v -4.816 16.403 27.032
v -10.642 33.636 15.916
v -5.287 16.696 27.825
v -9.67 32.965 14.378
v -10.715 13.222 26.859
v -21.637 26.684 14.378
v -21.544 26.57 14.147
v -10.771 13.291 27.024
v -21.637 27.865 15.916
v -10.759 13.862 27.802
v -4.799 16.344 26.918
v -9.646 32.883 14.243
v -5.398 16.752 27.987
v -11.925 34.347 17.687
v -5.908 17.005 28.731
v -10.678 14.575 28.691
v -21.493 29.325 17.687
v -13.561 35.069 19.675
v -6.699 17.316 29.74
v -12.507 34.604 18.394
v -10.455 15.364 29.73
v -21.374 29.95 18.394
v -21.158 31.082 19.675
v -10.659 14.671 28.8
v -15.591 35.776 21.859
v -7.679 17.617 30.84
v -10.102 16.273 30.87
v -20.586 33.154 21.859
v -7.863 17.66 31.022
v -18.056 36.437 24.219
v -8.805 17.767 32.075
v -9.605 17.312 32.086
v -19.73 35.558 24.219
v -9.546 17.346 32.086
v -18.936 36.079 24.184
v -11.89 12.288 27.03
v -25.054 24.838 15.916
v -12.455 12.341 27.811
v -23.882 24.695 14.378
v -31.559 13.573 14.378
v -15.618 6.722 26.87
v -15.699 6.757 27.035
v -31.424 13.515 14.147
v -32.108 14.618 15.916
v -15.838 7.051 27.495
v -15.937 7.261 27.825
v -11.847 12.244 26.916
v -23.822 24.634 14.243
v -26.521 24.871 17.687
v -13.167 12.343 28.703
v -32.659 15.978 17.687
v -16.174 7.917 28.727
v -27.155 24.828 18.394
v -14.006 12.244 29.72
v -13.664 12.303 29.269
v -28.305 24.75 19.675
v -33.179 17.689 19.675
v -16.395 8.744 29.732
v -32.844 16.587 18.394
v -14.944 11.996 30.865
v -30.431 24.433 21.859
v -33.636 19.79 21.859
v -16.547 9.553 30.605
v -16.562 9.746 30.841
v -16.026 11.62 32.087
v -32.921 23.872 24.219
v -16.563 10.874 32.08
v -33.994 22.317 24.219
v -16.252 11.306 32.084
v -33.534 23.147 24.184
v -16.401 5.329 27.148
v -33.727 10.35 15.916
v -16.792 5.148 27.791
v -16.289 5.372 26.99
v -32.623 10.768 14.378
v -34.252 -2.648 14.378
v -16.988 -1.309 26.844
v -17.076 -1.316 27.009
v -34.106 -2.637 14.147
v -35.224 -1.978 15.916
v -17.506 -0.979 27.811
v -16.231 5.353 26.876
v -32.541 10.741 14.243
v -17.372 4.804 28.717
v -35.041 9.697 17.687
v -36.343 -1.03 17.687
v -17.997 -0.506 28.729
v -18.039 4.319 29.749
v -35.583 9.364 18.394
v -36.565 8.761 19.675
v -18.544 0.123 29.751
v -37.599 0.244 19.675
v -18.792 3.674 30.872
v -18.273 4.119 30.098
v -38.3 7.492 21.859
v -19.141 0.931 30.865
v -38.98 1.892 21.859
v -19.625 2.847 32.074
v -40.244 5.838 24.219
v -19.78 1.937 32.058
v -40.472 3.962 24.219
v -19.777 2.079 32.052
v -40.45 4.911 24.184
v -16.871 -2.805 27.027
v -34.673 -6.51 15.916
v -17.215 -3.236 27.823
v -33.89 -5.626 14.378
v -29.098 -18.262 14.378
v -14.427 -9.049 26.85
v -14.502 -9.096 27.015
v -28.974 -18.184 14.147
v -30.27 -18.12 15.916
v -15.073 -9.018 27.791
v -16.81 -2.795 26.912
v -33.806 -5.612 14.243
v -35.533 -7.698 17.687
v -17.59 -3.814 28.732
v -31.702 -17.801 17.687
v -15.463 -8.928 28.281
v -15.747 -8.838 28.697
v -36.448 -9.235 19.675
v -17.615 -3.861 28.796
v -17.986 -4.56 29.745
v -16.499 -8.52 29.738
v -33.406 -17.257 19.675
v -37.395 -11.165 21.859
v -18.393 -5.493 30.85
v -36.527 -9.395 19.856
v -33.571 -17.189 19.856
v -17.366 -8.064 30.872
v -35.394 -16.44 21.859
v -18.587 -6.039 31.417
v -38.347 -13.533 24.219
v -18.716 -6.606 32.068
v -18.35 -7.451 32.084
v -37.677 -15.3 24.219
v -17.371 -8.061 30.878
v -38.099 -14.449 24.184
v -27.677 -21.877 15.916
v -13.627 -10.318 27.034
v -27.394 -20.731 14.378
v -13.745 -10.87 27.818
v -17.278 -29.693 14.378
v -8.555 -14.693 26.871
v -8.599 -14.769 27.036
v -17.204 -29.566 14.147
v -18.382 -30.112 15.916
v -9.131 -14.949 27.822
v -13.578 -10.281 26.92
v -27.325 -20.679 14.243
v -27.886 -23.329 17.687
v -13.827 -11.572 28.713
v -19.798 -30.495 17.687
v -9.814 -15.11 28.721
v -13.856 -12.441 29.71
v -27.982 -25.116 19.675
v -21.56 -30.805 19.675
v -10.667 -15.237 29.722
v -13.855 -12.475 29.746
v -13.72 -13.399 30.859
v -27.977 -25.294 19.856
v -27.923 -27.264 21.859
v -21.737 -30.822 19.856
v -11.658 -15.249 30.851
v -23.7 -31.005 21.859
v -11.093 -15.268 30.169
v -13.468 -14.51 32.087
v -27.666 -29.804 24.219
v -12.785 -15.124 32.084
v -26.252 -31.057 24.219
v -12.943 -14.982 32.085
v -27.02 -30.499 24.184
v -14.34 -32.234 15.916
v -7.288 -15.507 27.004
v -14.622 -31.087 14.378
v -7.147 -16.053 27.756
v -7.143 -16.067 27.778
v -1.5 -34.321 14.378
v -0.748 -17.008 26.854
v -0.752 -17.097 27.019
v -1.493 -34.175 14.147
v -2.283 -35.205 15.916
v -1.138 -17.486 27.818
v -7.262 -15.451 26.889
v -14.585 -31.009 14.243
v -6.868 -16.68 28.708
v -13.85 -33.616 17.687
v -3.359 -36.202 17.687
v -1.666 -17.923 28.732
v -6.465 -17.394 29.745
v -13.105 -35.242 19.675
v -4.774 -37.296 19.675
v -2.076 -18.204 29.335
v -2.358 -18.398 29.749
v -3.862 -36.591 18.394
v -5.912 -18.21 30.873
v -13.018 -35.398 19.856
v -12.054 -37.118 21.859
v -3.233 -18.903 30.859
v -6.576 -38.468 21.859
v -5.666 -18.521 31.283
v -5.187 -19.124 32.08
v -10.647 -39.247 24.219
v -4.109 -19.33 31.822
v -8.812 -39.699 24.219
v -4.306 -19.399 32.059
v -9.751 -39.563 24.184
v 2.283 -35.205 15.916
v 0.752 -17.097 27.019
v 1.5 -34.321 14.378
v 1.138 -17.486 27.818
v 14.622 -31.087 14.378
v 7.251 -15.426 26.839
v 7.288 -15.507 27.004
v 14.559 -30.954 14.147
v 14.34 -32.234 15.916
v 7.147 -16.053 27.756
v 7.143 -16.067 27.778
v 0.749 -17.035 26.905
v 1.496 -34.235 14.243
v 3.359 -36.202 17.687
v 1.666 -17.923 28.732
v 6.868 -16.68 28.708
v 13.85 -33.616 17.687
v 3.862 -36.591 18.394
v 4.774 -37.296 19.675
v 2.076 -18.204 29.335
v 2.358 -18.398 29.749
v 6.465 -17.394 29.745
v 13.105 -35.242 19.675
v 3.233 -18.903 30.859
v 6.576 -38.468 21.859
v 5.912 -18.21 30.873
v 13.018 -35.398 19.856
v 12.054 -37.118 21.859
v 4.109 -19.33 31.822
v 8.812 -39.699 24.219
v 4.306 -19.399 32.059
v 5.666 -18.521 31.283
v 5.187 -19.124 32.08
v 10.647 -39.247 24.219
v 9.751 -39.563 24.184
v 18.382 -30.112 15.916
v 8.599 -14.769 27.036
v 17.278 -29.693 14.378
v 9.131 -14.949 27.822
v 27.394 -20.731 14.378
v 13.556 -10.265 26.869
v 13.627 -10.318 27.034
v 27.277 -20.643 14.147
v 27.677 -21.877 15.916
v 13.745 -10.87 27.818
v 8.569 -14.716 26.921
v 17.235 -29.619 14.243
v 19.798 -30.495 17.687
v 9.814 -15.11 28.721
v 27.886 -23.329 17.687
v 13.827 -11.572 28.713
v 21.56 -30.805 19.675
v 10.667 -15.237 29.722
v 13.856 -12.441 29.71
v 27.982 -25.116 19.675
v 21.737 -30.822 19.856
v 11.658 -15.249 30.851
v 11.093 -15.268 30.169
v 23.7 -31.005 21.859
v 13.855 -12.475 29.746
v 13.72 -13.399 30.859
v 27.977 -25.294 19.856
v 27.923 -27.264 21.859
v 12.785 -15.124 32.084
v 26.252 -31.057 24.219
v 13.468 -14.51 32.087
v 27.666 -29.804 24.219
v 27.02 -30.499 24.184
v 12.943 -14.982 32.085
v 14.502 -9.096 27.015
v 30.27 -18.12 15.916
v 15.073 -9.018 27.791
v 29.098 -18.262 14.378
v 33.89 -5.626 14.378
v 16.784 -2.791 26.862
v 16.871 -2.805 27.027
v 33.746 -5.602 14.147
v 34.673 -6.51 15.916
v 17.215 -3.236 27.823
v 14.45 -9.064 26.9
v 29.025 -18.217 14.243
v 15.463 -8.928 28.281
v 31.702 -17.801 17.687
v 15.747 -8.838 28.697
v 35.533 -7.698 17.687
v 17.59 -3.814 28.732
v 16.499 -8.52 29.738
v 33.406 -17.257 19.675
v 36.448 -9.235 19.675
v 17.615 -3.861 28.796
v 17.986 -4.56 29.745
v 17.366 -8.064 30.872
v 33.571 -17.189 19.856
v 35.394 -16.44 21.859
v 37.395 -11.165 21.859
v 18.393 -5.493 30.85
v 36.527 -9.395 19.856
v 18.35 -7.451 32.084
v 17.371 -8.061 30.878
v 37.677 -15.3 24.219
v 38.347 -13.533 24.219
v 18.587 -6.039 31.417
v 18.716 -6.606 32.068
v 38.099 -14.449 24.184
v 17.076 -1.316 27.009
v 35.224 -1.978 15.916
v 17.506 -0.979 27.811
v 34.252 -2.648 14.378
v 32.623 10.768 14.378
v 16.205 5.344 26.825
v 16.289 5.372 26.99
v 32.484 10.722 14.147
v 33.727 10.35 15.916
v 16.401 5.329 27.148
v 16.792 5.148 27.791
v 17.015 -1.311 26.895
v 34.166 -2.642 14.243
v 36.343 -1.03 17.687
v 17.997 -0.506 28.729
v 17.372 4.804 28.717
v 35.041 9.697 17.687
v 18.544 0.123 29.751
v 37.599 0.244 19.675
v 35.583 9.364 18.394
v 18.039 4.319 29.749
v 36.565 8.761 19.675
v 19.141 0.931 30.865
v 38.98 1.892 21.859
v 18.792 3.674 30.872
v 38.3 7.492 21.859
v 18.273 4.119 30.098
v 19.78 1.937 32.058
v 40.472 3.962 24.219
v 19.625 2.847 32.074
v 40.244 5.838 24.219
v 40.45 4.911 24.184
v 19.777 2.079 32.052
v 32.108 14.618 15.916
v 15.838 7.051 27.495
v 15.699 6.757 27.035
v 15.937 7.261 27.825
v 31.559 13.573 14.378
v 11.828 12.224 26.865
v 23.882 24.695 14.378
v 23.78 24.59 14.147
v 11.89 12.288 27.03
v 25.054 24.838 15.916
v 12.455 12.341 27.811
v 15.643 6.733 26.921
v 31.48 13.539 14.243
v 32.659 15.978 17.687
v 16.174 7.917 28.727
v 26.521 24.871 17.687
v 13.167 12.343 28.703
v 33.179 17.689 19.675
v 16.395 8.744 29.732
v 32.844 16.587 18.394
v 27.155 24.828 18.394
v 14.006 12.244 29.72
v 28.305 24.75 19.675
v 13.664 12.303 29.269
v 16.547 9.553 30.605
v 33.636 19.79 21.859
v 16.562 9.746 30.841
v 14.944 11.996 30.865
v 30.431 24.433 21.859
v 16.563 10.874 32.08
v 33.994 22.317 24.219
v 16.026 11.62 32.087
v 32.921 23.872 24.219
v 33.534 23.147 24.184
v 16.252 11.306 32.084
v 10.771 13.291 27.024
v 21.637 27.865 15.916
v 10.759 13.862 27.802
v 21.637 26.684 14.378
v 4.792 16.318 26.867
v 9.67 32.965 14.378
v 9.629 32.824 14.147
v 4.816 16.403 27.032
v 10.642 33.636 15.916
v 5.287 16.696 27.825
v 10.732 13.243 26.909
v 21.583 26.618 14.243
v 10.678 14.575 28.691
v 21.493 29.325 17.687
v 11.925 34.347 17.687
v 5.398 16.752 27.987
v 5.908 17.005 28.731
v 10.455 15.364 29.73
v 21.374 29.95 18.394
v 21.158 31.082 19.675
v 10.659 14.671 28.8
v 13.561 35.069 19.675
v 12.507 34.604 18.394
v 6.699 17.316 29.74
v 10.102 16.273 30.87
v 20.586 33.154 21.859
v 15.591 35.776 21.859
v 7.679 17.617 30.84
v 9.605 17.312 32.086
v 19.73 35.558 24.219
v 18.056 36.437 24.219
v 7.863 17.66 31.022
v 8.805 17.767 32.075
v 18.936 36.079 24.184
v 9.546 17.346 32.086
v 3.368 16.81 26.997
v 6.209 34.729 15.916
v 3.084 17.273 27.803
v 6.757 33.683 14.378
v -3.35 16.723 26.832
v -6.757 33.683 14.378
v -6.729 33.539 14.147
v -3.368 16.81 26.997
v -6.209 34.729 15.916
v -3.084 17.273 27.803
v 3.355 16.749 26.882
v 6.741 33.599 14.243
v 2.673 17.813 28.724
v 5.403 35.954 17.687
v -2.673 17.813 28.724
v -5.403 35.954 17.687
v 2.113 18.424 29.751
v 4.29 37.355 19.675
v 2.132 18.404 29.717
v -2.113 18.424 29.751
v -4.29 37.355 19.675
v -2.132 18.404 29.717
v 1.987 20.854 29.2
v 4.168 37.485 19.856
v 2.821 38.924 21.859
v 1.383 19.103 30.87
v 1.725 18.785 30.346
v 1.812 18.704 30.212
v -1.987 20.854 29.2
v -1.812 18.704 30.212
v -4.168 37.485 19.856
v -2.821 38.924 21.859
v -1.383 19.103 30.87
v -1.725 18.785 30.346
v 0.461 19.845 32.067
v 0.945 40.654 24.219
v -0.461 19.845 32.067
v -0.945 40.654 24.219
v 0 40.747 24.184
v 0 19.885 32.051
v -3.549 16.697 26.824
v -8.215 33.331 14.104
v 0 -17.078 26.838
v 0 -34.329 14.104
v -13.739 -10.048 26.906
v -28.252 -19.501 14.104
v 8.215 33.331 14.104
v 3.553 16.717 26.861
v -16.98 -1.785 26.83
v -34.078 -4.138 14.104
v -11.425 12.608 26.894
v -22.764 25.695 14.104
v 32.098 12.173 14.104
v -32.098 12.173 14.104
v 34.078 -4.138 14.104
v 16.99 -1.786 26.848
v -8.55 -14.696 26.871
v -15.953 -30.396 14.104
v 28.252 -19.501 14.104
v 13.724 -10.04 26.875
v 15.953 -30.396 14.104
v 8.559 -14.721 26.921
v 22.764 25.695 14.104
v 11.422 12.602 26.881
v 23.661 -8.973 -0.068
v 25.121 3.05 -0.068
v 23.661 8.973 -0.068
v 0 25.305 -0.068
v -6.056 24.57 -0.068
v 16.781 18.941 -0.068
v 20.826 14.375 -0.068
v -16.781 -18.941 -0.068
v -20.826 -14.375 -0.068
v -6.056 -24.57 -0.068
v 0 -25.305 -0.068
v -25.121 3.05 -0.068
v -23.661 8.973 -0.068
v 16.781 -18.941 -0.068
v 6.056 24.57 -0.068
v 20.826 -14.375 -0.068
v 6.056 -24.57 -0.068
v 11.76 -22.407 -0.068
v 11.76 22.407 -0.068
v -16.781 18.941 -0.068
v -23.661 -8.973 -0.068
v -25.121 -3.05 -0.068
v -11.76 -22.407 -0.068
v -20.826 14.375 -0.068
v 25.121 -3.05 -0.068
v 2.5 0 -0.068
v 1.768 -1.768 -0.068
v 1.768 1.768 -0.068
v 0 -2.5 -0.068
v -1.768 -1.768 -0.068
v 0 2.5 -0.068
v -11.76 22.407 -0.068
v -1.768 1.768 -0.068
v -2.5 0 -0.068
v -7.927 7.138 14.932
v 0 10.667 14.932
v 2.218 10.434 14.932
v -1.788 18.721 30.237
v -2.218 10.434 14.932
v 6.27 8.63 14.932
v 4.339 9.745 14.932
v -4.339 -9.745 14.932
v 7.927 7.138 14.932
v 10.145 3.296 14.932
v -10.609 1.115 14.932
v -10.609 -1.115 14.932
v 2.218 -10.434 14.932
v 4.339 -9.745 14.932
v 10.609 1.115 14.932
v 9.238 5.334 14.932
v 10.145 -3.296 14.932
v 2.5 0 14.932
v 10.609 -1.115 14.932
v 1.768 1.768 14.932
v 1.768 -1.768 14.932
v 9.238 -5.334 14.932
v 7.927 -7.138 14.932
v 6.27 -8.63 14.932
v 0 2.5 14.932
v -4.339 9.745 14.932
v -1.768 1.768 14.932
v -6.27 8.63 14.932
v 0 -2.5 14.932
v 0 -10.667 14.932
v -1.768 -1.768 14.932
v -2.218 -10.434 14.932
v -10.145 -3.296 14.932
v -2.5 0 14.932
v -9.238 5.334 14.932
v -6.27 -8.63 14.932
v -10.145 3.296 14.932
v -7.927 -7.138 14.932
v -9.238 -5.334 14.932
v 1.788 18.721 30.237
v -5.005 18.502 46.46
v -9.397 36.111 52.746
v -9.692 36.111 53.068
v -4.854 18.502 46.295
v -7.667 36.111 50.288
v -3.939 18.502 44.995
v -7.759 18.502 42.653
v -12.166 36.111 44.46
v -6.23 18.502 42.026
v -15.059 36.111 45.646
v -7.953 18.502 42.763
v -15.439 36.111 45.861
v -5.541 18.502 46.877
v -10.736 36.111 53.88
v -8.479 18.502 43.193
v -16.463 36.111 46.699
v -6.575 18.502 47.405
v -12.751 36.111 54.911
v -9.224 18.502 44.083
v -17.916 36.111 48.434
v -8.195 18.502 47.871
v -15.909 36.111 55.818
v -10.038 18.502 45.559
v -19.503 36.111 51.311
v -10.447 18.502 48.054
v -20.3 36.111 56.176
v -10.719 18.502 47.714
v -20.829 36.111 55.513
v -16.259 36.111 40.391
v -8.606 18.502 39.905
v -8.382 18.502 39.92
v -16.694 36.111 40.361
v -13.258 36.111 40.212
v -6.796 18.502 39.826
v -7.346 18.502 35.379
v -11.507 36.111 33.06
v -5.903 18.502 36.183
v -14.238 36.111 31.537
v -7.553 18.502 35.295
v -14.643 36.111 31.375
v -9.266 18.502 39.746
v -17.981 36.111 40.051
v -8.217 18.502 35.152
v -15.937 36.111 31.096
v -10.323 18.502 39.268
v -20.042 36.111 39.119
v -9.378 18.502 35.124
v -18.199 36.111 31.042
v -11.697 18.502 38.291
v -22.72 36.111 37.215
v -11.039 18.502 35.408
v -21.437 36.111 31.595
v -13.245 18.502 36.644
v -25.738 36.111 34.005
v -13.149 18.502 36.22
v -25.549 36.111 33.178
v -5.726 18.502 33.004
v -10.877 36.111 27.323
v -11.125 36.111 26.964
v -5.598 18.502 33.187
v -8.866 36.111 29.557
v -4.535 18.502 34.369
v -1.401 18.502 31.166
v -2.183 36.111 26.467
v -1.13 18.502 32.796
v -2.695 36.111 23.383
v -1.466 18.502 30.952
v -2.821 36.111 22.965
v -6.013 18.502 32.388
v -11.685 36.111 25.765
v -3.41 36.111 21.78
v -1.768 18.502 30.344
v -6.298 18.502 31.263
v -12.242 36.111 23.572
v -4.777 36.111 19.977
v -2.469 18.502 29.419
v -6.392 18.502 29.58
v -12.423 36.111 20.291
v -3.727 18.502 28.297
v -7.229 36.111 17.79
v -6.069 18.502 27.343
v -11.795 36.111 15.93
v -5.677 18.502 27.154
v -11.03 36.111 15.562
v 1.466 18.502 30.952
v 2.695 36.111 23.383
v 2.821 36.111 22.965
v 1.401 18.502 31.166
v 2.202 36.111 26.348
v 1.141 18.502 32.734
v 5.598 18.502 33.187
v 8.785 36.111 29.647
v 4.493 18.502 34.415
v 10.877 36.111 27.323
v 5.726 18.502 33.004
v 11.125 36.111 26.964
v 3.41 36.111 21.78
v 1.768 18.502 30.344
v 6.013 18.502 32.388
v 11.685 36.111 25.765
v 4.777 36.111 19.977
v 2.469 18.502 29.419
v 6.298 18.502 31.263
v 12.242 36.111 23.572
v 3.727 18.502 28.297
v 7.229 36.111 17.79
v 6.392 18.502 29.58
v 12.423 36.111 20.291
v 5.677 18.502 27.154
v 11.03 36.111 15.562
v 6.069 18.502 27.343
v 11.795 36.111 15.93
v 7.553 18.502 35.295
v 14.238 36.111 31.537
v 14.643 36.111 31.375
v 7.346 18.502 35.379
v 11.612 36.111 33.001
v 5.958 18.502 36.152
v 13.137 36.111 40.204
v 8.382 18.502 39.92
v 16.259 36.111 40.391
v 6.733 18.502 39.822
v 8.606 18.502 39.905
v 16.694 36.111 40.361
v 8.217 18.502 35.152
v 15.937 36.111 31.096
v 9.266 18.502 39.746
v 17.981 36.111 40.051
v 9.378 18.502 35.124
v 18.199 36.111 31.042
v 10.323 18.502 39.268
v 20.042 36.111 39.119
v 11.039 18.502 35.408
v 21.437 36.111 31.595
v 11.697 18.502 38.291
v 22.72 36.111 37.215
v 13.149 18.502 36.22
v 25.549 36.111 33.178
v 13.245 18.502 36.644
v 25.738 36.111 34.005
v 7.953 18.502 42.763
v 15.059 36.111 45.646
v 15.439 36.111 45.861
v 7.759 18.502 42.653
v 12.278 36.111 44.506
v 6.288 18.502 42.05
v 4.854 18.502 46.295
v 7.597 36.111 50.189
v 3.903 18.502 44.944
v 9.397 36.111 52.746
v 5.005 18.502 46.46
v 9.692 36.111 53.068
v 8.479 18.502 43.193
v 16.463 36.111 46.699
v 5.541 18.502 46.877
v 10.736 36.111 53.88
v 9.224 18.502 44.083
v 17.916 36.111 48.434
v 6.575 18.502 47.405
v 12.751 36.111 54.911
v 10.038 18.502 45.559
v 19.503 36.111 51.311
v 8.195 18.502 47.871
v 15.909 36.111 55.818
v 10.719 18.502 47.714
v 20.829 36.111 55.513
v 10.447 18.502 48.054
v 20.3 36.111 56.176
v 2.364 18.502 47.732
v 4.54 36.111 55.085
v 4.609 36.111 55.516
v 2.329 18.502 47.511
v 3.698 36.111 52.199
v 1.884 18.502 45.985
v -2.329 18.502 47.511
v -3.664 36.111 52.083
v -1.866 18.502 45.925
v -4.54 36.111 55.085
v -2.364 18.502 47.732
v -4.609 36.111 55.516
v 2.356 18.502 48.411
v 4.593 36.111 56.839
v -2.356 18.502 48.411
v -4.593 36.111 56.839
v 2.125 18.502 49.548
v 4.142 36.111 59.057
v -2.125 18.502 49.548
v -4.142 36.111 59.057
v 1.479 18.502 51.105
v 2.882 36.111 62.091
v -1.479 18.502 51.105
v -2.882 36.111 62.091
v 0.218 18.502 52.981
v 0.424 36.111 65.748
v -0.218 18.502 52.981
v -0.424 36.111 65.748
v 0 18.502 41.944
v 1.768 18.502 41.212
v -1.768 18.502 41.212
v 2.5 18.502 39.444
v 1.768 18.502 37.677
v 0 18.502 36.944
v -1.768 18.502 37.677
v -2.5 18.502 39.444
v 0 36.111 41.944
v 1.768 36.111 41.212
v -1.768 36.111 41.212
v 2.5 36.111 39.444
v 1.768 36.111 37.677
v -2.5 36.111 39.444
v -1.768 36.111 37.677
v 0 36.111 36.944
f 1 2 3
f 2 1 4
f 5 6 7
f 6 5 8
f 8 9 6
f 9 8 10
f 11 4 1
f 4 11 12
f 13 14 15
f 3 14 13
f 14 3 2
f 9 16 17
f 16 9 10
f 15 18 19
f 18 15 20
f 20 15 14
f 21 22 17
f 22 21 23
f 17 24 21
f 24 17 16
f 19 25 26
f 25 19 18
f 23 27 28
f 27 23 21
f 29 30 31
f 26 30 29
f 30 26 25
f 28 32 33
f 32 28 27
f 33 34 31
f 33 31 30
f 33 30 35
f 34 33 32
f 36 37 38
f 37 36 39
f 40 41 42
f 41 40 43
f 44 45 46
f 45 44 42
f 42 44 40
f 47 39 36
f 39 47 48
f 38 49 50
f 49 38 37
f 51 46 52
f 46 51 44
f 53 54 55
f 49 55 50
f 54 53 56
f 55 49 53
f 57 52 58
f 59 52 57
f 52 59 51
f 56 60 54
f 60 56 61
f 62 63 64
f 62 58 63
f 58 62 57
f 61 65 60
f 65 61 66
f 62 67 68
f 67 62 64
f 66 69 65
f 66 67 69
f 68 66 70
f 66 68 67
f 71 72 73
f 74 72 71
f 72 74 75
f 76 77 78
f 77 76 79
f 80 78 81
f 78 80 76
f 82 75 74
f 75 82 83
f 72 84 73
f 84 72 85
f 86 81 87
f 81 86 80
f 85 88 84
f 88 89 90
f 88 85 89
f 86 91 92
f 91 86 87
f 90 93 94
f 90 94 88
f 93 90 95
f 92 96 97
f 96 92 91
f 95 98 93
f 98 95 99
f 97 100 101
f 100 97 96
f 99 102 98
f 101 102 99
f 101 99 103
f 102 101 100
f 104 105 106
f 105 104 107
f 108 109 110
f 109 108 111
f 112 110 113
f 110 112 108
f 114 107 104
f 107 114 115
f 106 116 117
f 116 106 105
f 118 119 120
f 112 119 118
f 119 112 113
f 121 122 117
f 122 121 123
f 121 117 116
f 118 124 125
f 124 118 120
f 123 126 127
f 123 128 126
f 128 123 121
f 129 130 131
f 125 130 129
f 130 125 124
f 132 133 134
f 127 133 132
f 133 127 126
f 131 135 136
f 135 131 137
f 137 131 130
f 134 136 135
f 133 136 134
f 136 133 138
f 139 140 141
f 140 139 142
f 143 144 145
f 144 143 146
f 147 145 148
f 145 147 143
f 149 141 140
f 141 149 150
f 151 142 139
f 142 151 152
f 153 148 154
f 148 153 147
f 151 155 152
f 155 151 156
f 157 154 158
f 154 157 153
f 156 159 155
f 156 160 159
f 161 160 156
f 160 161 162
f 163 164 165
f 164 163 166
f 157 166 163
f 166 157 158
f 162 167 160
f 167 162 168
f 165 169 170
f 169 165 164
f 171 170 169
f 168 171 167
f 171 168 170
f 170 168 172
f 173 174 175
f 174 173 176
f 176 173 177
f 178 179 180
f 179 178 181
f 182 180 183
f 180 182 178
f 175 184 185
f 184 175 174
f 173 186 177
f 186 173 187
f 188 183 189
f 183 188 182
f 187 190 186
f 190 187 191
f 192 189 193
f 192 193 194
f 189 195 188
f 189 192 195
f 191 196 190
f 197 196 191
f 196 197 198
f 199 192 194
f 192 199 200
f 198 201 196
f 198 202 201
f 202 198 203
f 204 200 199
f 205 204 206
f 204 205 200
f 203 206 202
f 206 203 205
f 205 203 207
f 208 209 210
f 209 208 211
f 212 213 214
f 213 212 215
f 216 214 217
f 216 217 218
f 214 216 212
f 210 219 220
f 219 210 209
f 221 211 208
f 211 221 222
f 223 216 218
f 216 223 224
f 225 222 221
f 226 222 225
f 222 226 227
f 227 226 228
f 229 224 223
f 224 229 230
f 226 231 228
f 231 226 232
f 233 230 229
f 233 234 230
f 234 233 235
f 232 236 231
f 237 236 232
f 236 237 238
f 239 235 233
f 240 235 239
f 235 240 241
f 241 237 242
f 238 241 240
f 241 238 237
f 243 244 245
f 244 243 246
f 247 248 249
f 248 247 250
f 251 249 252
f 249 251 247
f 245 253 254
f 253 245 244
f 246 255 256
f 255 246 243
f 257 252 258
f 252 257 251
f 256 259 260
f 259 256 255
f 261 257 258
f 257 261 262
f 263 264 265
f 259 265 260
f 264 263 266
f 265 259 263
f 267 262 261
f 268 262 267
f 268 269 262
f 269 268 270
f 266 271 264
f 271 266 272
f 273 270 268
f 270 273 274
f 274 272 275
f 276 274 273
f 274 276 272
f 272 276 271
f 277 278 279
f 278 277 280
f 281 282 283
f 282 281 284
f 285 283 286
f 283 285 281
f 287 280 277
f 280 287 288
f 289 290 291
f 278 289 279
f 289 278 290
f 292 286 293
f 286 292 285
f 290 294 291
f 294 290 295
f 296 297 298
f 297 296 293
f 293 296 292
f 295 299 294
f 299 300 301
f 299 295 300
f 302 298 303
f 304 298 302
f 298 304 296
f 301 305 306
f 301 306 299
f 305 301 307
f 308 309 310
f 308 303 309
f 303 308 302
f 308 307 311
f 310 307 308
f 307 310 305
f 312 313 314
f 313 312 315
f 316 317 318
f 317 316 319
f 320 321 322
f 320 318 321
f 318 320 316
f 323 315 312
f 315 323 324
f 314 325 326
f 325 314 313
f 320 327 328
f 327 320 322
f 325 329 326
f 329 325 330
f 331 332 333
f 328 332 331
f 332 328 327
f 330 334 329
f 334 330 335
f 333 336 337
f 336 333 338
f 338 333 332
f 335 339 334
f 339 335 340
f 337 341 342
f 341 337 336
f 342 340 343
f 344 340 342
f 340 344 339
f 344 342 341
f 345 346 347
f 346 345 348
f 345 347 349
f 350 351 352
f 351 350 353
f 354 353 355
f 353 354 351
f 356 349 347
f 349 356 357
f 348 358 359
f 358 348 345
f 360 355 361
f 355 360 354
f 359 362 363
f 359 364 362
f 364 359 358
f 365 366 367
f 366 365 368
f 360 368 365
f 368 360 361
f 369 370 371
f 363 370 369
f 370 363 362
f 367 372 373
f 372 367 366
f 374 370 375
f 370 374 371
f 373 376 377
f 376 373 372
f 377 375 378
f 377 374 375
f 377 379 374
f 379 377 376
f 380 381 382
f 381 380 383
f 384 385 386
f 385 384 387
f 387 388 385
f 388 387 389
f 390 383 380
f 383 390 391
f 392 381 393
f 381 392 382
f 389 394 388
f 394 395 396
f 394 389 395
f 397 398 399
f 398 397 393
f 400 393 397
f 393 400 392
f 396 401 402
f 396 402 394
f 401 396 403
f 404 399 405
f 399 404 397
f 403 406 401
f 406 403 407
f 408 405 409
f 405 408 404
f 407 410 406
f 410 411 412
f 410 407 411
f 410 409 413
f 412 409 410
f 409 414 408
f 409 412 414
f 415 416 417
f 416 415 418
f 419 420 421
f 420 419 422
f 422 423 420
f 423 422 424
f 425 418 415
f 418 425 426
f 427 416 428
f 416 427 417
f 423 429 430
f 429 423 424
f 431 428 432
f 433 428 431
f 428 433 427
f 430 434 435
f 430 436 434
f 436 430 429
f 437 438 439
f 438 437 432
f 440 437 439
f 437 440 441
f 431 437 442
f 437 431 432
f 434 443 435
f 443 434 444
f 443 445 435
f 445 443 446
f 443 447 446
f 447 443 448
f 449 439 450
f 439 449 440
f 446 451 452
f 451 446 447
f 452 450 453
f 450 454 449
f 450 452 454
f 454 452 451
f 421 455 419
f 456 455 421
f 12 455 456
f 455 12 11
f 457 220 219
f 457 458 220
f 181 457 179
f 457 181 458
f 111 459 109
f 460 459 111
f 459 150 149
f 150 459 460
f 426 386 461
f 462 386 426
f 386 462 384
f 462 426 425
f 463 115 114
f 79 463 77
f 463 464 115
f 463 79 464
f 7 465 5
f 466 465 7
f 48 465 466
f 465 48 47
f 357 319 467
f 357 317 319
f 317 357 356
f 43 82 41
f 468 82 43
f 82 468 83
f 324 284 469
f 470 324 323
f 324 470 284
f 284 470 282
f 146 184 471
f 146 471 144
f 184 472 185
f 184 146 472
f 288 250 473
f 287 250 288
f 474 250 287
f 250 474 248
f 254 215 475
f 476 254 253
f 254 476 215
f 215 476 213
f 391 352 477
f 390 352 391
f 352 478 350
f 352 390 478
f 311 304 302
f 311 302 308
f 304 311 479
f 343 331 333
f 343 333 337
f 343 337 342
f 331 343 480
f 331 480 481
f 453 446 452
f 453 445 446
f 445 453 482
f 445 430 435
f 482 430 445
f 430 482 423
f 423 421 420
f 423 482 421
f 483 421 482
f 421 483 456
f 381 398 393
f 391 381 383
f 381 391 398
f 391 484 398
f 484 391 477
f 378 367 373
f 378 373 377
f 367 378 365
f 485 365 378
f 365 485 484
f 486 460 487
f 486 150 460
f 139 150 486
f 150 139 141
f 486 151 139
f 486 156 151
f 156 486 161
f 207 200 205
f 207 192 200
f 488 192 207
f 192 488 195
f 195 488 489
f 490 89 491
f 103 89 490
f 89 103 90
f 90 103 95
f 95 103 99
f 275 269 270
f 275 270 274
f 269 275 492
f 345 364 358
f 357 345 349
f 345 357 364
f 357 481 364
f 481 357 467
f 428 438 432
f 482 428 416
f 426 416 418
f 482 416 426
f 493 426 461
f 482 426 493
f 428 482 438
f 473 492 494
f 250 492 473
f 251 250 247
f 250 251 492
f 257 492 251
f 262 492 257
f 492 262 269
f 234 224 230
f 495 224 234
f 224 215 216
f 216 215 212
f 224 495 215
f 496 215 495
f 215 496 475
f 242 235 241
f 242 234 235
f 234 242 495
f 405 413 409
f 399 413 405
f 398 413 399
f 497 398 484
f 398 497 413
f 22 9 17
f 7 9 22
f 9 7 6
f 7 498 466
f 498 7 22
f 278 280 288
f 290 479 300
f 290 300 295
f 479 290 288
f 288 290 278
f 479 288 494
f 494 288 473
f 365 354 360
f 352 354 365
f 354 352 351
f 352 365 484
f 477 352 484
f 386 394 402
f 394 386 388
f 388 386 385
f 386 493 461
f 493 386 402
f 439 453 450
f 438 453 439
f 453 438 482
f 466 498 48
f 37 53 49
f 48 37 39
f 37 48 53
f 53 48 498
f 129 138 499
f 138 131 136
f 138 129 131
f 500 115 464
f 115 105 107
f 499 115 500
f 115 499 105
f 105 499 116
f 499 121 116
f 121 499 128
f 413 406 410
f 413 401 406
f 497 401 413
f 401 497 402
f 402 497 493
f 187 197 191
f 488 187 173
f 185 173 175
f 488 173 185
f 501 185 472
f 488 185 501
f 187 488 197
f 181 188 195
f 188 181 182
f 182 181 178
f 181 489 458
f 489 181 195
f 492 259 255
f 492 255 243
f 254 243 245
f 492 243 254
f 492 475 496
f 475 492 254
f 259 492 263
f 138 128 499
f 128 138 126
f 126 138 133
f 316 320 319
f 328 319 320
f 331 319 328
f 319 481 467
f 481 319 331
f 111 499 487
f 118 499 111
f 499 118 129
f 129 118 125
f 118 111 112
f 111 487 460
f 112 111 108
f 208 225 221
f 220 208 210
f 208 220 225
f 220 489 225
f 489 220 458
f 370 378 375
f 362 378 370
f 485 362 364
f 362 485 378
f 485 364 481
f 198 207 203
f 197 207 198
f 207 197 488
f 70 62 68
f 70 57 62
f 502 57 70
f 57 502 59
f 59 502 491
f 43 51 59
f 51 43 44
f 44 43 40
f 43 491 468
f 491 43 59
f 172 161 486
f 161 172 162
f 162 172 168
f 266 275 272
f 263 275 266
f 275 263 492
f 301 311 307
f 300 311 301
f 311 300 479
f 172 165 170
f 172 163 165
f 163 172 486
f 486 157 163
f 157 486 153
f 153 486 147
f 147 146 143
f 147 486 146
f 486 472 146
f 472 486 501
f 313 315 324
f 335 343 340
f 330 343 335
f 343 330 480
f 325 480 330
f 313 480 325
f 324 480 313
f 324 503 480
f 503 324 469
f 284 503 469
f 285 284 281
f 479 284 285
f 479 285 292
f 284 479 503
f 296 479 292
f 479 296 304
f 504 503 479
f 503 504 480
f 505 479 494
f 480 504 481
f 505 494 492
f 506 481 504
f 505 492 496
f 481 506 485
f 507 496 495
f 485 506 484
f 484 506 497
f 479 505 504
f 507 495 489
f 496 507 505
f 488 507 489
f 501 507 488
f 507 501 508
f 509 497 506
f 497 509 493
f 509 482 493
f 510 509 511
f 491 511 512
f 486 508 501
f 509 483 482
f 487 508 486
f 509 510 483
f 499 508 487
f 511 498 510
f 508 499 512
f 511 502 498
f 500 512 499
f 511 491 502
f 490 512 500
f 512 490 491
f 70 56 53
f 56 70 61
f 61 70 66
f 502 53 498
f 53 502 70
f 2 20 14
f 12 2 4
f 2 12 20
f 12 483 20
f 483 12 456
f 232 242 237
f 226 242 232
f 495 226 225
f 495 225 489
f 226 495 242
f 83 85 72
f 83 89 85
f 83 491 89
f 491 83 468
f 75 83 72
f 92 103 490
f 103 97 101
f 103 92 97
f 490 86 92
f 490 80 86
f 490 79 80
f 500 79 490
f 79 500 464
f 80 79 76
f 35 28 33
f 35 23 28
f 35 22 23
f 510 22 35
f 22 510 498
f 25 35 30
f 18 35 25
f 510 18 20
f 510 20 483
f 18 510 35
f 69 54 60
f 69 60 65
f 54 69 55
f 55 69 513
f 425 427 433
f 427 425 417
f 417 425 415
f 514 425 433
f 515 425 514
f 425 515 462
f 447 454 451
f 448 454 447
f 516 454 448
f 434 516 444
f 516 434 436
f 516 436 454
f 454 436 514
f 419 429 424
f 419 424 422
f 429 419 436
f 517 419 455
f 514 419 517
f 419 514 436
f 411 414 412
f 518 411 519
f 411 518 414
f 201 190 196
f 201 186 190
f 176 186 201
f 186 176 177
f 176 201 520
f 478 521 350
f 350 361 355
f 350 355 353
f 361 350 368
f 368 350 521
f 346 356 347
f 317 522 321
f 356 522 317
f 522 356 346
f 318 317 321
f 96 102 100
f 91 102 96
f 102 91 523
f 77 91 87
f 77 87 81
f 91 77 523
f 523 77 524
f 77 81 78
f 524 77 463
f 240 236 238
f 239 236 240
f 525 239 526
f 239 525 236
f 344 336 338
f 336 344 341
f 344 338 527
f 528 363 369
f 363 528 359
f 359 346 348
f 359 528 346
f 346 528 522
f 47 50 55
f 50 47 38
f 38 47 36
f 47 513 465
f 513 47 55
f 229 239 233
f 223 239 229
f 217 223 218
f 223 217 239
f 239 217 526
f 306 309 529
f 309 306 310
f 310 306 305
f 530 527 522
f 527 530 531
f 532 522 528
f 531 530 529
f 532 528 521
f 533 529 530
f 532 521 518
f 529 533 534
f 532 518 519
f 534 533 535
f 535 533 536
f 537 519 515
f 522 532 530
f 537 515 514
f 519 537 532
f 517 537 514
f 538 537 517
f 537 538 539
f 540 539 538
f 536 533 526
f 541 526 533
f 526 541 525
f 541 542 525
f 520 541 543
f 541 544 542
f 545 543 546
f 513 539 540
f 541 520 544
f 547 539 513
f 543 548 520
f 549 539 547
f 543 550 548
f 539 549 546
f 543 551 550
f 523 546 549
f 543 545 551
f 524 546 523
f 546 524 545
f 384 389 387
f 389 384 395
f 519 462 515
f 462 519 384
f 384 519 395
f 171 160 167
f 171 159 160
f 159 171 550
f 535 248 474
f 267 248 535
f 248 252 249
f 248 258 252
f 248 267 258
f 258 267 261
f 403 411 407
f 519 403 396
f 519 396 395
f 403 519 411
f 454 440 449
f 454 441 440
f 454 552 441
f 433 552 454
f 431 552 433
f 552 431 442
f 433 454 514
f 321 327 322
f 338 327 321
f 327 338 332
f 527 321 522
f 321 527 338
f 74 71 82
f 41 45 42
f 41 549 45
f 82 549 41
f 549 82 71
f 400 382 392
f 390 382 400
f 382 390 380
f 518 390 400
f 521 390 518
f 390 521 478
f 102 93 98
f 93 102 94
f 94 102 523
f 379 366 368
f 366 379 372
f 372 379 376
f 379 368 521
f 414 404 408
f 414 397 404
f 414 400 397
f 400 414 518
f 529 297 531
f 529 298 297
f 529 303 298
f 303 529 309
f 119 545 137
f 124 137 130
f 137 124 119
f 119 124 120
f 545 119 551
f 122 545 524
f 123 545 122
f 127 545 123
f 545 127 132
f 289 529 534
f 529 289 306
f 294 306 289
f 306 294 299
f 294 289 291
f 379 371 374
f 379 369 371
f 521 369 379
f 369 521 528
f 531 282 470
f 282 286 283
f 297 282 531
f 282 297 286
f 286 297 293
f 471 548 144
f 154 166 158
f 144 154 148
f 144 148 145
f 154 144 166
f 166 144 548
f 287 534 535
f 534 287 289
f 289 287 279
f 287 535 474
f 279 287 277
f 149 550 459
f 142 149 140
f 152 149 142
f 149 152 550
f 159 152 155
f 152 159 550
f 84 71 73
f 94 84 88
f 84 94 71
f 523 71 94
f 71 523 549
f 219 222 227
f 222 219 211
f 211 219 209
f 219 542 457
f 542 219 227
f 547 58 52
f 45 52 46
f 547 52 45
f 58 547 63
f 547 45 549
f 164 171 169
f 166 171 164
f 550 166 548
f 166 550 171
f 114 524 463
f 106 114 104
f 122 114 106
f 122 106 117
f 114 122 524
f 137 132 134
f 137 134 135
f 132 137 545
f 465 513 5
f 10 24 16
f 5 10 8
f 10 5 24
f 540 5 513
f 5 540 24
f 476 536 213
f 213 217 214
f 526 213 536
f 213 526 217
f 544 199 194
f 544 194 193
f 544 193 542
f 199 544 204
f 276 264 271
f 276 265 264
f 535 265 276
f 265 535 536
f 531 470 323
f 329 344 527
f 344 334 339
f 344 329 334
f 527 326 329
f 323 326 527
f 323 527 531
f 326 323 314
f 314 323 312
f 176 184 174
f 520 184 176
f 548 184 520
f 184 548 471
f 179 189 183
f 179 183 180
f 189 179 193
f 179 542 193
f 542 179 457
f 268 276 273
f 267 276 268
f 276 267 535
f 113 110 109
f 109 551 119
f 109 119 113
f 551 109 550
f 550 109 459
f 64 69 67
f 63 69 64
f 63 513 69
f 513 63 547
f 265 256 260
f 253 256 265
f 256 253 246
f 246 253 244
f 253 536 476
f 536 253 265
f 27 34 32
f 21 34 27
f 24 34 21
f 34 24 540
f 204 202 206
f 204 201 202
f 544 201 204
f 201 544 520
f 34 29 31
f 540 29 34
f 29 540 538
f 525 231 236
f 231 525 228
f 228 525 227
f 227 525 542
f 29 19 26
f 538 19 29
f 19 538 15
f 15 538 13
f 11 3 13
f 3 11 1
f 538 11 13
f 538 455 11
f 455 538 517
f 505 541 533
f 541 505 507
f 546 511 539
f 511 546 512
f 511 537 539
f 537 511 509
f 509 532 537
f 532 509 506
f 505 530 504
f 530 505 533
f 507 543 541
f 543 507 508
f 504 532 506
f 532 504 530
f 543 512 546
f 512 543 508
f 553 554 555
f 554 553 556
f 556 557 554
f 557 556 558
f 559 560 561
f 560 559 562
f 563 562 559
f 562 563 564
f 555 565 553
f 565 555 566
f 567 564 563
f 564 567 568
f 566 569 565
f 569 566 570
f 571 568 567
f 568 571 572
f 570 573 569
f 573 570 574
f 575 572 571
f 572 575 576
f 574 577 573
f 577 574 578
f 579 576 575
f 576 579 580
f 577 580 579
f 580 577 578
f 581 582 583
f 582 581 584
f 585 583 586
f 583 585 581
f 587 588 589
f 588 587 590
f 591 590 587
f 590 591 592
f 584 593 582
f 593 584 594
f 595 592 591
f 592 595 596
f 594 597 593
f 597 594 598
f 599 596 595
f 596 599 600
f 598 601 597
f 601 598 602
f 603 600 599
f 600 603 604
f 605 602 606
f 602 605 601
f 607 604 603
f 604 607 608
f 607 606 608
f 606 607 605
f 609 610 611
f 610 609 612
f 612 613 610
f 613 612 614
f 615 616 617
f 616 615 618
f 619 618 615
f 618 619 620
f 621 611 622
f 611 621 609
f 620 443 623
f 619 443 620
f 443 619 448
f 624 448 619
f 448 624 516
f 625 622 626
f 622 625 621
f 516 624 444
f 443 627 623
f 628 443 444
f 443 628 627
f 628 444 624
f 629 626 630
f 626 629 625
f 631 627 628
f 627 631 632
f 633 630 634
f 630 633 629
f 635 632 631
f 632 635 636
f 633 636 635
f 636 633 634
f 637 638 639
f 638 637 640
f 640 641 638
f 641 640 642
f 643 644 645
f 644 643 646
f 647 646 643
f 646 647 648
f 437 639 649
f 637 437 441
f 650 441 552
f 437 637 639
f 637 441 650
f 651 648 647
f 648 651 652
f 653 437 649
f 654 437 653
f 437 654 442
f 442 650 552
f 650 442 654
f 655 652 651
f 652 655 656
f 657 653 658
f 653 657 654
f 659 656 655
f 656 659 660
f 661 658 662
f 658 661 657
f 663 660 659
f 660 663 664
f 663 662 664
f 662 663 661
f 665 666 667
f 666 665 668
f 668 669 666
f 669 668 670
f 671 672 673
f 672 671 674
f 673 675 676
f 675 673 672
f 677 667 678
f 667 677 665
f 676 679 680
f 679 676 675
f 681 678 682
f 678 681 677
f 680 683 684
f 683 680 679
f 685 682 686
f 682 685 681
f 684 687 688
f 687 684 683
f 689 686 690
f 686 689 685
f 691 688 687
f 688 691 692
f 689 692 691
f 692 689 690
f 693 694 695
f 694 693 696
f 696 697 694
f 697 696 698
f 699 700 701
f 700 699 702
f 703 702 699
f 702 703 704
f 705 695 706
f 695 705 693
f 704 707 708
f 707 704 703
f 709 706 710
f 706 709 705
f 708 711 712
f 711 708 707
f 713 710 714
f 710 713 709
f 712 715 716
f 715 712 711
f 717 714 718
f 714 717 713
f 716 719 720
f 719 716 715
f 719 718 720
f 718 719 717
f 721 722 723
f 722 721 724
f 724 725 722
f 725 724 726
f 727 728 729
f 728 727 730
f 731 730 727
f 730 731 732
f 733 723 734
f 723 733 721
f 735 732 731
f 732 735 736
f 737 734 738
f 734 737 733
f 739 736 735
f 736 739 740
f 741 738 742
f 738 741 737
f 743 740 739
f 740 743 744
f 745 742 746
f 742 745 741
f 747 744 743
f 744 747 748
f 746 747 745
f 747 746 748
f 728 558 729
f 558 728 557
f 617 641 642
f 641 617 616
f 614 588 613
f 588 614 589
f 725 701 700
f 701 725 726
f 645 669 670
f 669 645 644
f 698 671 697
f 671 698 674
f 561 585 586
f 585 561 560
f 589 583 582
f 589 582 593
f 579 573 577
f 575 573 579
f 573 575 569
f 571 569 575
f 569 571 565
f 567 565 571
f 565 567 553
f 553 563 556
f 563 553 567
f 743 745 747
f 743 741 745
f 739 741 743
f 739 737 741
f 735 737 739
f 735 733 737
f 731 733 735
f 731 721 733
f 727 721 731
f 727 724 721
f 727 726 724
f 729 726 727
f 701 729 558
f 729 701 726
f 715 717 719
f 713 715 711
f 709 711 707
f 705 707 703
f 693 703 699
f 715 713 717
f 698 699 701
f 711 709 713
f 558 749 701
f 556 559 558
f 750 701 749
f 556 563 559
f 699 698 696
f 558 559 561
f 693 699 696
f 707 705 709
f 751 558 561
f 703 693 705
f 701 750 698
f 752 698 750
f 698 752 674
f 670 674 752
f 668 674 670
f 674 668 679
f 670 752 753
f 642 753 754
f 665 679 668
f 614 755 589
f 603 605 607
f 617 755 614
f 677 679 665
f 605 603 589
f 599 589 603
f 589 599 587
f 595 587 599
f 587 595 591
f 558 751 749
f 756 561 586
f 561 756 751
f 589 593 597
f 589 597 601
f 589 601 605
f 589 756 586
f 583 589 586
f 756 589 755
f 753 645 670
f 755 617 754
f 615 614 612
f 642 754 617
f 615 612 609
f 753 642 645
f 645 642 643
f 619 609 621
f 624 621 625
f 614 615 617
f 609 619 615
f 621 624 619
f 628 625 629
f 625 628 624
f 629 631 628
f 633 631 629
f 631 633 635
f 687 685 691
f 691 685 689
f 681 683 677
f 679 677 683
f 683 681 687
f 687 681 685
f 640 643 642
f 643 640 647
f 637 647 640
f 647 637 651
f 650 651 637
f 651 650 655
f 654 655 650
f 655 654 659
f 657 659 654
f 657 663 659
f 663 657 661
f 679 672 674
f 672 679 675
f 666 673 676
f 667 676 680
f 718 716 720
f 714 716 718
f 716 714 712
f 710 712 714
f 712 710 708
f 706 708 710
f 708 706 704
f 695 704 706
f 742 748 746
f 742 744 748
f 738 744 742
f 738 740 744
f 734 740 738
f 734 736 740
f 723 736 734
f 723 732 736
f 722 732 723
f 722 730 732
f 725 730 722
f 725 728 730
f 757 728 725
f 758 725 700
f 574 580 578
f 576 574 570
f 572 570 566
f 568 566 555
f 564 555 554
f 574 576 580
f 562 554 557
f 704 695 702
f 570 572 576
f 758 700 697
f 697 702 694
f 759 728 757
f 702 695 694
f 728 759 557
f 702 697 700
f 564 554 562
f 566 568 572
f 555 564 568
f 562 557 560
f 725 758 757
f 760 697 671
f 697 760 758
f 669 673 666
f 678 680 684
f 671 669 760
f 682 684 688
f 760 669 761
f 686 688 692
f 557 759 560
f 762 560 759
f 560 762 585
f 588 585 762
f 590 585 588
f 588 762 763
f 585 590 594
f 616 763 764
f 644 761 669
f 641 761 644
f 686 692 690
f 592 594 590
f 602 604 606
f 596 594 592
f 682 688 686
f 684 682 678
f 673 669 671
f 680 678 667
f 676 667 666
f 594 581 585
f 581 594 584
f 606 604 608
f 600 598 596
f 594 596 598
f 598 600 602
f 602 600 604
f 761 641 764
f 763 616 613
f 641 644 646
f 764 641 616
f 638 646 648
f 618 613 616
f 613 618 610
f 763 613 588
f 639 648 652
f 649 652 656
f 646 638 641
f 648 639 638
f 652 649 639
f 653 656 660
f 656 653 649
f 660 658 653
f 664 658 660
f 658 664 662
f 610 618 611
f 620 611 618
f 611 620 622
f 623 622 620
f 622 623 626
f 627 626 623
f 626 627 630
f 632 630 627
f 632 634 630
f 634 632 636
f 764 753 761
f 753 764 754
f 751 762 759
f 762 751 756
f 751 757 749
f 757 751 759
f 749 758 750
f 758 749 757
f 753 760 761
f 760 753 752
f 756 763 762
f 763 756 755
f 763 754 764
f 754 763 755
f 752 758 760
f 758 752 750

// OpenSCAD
// Parametric Involute Bevel and Spur Gears by GregFrost
// It is licensed under the Creative Commons - GNU GPL license.
// © 2010 by GregFrost
// http://www.thingiverse.com/thing:3575

// Recent Changes
// V6.0: correct winding on bevel gear teeth.

// Simple Test:
//gear (circular_pitch=700,
//	gear_thickness = 12,
//	rim_thickness = 15,
//	hub_thickness = 17,
//	circles=8);

//Complex Spur Gear Test:
//test_gears ();

// Meshing Double Helix:
//meshing_double_helix ();

// Demonstrate the backlash option for Spur gears.
//test_backlash ();

// Demonstrate how to make meshing bevel gears.
bevel_gear_pair ();

pi=3.1415926535897932384626433832795;

//==================================================
// Bevel Gears:
// Two gears with the same cone distance, circular pitch (measured at the cone distance) 
// and pressure angle will mesh.

module bevel_gear_pair (
	gear1_teeth = 13,
	gear2_teeth = 7,
	axis_angle = 90,
	outside_circular_pitch=1000)
{
	outside_pitch_radius1 = gear1_teeth * outside_circular_pitch / 360;
	outside_pitch_radius2 = gear2_teeth * outside_circular_pitch / 360;
	pitch_apex1=outside_pitch_radius2 * sin (axis_angle) + 
		(outside_pitch_radius2 * cos (axis_angle) + outside_pitch_radius1) / tan (axis_angle);
	cone_distance = sqrt (pow (pitch_apex1, 2) + pow (outside_pitch_radius1, 2));
	pitch_apex2 = sqrt (pow (cone_distance, 2) - pow (outside_pitch_radius2, 2));
	echo ("cone_distance", cone_distance);
	pitch_angle1 = asin (outside_pitch_radius1 / cone_distance);
	pitch_angle2 = asin (outside_pitch_radius2 / cone_distance);
	echo ("pitch_angle1, pitch_angle2", pitch_angle1, pitch_angle2);
	echo ("pitch_angle1 + pitch_angle2", pitch_angle1 + pitch_angle2);

	rotate([0,0,90])
	translate ([0,0,pitch_apex1+20])
	{
		translate([0,0,-pitch_apex1])
		bevel_gear (
			number_of_teeth=gear1_teeth,
			cone_distance=cone_distance,
			pressure_angle=30,
			outside_circular_pitch=outside_circular_pitch);
	
		rotate([0,-(pitch_angle1+pitch_angle2),0])
		translate([0,0,-pitch_apex2])
		bevel_gear (
			number_of_teeth=gear2_teeth,
			cone_distance=cone_distance,
			pressure_angle=30,
			outside_circular_pitch=outside_circular_pitch);
	}
}

//Bevel Gear Finishing Options:
bevel_gear_flat = 0;
bevel_gear_back_cone = 1;

module bevel_gear (
	number_of_teeth=11,
	cone_distance=100,
	face_width=20,
	outside_circular_pitch=1000,
	pressure_angle=30,
	clearance = 0.2,
	bore_diameter=5,
	gear_thickness = 15,
	backlash = 0,
	involute_facets=0,
	finish = -1)
{
	echo ("bevel_gear",
		"teeth", number_of_teeth,
		"cone distance", cone_distance,
		face_width,
		outside_circular_pitch,
		pressure_angle,
		clearance,
		bore_diameter,
		involute_facets,
		finish);

	// Pitch diameter: Diameter of pitch circle at the fat end of the gear.
	outside_pitch_diameter  =  number_of_teeth * outside_circular_pitch / 180;
	outside_pitch_radius = outside_pitch_diameter / 2;

	// The height of the pitch apex.
	pitch_apex = sqrt (pow (cone_distance, 2) - pow (outside_pitch_radius, 2));
	pitch_angle = asin (outside_pitch_radius/cone_distance);

	echo ("Num Teeth:", number_of_teeth, " Pitch Angle:", pitch_angle);

	finish = (finish != -1) ? finish : (pitch_angle < 45) ? bevel_gear_flat : bevel_gear_back_cone;

	apex_to_apex=cone_distance / cos (pitch_angle);
	back_cone_radius = apex_to_apex * sin (pitch_angle);

	// Calculate and display the pitch angle. This is needed to determine the angle to mount two meshing cone gears.

	// Base Circle for forming the involute teeth shape.
	base_radius = back_cone_radius * cos (pressure_angle);	

	// Diametrial pitch: Number of teeth per unit length.
	pitch_diametrial = number_of_teeth / outside_pitch_diameter;

	// Addendum: Radial distance from pitch circle to outside circle.
	addendum = 1 / pitch_diametrial;
	// Outer Circle
	outer_radius = back_cone_radius + addendum;

	// Dedendum: Radial distance from pitch circle to root diameter
	dedendum = addendum + clearance;
	dedendum_angle = atan (dedendum / cone_distance);
	root_angle = pitch_angle - dedendum_angle;

	root_cone_full_radius = tan (root_angle)*apex_to_apex;
	back_cone_full_radius=apex_to_apex / tan (pitch_angle);

	back_cone_end_radius = 
		outside_pitch_radius - 
		dedendum * cos (pitch_angle) - 
		gear_thickness / tan (pitch_angle);
	back_cone_descent = dedendum * sin (pitch_angle) + gear_thickness;

	// Root diameter: Diameter of bottom of tooth spaces.
	root_radius = back_cone_radius - dedendum;

	half_tooth_thickness = outside_pitch_radius * sin (360 / (4 * number_of_teeth)) - backlash / 4;
	half_thick_angle = asin (half_tooth_thickness / back_cone_radius);

	face_cone_height = apex_to_apex-face_width / cos (pitch_angle);
	face_cone_full_radius = face_cone_height / tan (pitch_angle);
	face_cone_descent = dedendum * sin (pitch_angle);
	face_cone_end_radius = 
		outside_pitch_radius -
		face_width / sin (pitch_angle) - 
		face_cone_descent / tan (pitch_angle);

	// For the bevel_gear_flat finish option, calculate the height of a cube to select the portion of the gear that includes the full pitch face.
	bevel_gear_flat_height = pitch_apex - (cone_distance - face_width) * cos (pitch_angle);

//	translate([0,0,-pitch_apex])
	difference ()
	{
		intersection ()
		{
			union()
			{
				rotate (half_thick_angle)
				translate ([0,0,pitch_apex-apex_to_apex])
				cylinder ($fn=number_of_teeth*2, r1=root_cone_full_radius,r2=0,h=apex_to_apex);
				for (i = [1:number_of_teeth])
//				for (i = [1:1])
				{
					rotate ([0,0,i*360/number_of_teeth])
					{
						render()
						involute_bevel_gear_tooth (
							back_cone_radius = back_cone_radius,
							root_radius = root_radius,
							base_radius = base_radius,
							outer_radius = outer_radius,
							pitch_apex = pitch_apex,
							cone_distance = cone_distance,
							half_thick_angle = half_thick_angle,
							involute_facets = involute_facets);
					}
				}
			}

			if (finish == bevel_gear_back_cone)
			{
				translate ([0,0,-back_cone_descent])
				cylinder (
					$fn=number_of_teeth*2, 
					r1=back_cone_end_radius,
					r2=back_cone_full_radius*2,
					h=apex_to_apex + back_cone_descent);
			}
			else
			{
				translate ([-1.5*outside_pitch_radius,-1.5*outside_pitch_radius,0])
				cube ([3*outside_pitch_radius,
					3*outside_pitch_radius,
					bevel_gear_flat_height]);
			}
		}
		
		if (finish == bevel_gear_back_cone)
		{
			translate ([0,0,-face_cone_descent])
			cylinder (
				r1=face_cone_end_radius,
				r2=face_cone_full_radius * 2,
				h=face_cone_height + face_cone_descent+pitch_apex);
		}

		translate ([0,0,pitch_apex - apex_to_apex])
		cylinder (r=bore_diameter/2,h=apex_to_apex);
	}	
}

module involute_bevel_gear_tooth (
	back_cone_radius,
	root_radius,
	base_radius,
	outer_radius,
	pitch_apex,
	cone_distance,
	half_thick_angle,
	involute_facets)
{
//	echo ("involute_bevel_gear_tooth",
//		back_cone_radius,
//		root_radius,
//		base_radius,
//		outer_radius,
//		pitch_apex,
//		cone_distance,
//		half_thick_angle);

	min_radius = max (base_radius*2,root_radius*2);

	pitch_point = 
		involute (
			base_radius*2, 
			involute_intersect_angle (base_radius*2, back_cone_radius*2));
	pitch_angle = atan2 (pitch_point[1], pitch_point[0]);
	centre_angle = pitch_angle + half_thick_angle;

	start_angle = involute_intersect_angle (base_radius*2, min_radius);
	stop_angle = involute_intersect_angle (base_radius*2, outer_radius*2);

	res=(involute_facets!=0)?involute_facets:($fn==0)?5:$fn/4;

	translate ([0,0,pitch_apex])
	rotate ([0,-atan(back_cone_radius/cone_distance),0])
	translate ([-back_cone_radius*2,0,-cone_distance*2])
	union ()
	{
		for (i=[1:res])
		{
			assign (
				point1=
					involute (base_radius*2,start_angle+(stop_angle - start_angle)*(i-1)/res),
				point2=
					involute (base_radius*2,start_angle+(stop_angle - start_angle)*(i)/res))
			{
				assign (
					side1_point1 = rotate_point (centre_angle, point1),
					side1_point2 = rotate_point (centre_angle, point2),
					side2_point1 = mirror_point (rotate_point (centre_angle, point1)),
					side2_point2 = mirror_point (rotate_point (centre_angle, point2)))
				{
					polyhedron (
						points=[
							[back_cone_radius*2+0.1,0,cone_distance*2],
							[side1_point1[0],side1_point1[1],0],
							[side1_point2[0],side1_point2[1],0],
							[side2_point2[0],side2_point2[1],0],
							[side2_point1[0],side2_point1[1],0],
							[0.1,0,0]],
						triangles=[[0,2,1],[0,3,2],[0,4,3],[0,1,5],[1,2,5],[2,3,5],[3,4,5],[0,5,4]]);
				}
			}
		}
	}
}

module gear (
	number_of_teeth=15,
	circular_pitch=false, diametral_pitch=false,
	pressure_angle=28,
	clearance = 0.2,
	gear_thickness=5,
	rim_thickness=8,
	rim_width=5,
	hub_thickness=10,
	hub_diameter=15,
	bore_diameter=5,
	circles=0,
	backlash=0,
	twist=0,
	involute_facets=0)
{
	if (circular_pitch==false && diametral_pitch==false) 
		echo("MCAD ERROR: gear module needs either a diametral_pitch or circular_pitch");

	//Convert diametrial pitch to our native circular pitch
	circular_pitch = (circular_pitch!=false?circular_pitch:180/diametral_pitch);

	// Pitch diameter: Diameter of pitch circle.
	pitch_diameter  =  number_of_teeth * circular_pitch / 180;
	pitch_radius = pitch_diameter/2;
	echo ("Teeth:", number_of_teeth, " Pitch radius:", pitch_radius);

	// Base Circle
	base_radius = pitch_radius*cos(pressure_angle);

	// Diametrial pitch: Number of teeth per unit length.
	pitch_diametrial = number_of_teeth / pitch_diameter;

	// Addendum: Radial distance from pitch circle to outside circle.
	addendum = 1/pitch_diametrial;

	//Outer Circle
	outer_radius = pitch_radius+addendum;

	// Dedendum: Radial distance from pitch circle to root diameter
	dedendum = addendum + clearance;

	// Root diameter: Diameter of bottom of tooth spaces.
	root_radius = pitch_radius-dedendum;
	backlash_angle = backlash / pitch_radius * 180 / pi;
	half_thick_angle = (360 / number_of_teeth - backlash_angle) / 4;

	// Variables controlling the rim.
	rim_radius = root_radius - rim_width;

	// Variables controlling the circular holes in the gear.
	circle_orbit_diameter=hub_diameter/2+rim_radius;
	circle_orbit_curcumference=pi*circle_orbit_diameter;

	// Limit the circle size to 90% of the gear face.
	circle_diameter=
		min (
			0.70*circle_orbit_curcumference/circles,
			(rim_radius-hub_diameter/2)*0.9);

	difference ()
	{
		union ()
		{
			difference ()
			{
				linear_extrude (height=rim_thickness, convexity=10, twist=twist)
				gear_shape (
					number_of_teeth,
					pitch_radius = pitch_radius,
					root_radius = root_radius,
					base_radius = base_radius,
					outer_radius = outer_radius,
					half_thick_angle = half_thick_angle,
					involute_facets=involute_facets);

				if (gear_thickness < rim_thickness)
					translate ([0,0,gear_thickness])
					cylinder (r=rim_radius,h=rim_thickness-gear_thickness+1);
			}
			if (gear_thickness > rim_thickness)
				cylinder (r=rim_radius,h=gear_thickness);
			if (hub_thickness > gear_thickness)
				translate ([0,0,gear_thickness])
				cylinder (r=hub_diameter/2,h=hub_thickness-gear_thickness);
		}
		translate ([0,0,-1])
		cylinder (
			r=bore_diameter/2,
			h=2+max(rim_thickness,hub_thickness,gear_thickness));
		if (circles>0)
		{
			for(i=[0:circles-1])	
				rotate([0,0,i*360/circles])
				translate([circle_orbit_diameter/2,0,-1])
				cylinder(r=circle_diameter/2,h=max(gear_thickness,rim_thickness)+3);
		}
	}
}

module gear_shape (
	number_of_teeth,
	pitch_radius,
	root_radius,
	base_radius,
	outer_radius,
	half_thick_angle,
	involute_facets)
{
	union()
	{
		rotate (half_thick_angle) circle ($fn=number_of_teeth*2, r=root_radius);

		for (i = [1:number_of_teeth])
		{
			rotate ([0,0,i*360/number_of_teeth])
			{
				render()
				involute_gear_tooth (
					pitch_radius = pitch_radius,
					root_radius = root_radius,
					base_radius = base_radius,
					outer_radius = outer_radius,
					half_thick_angle = half_thick_angle,
					involute_facets=involute_facets);
			}
		}
	}
}

module involute_gear_tooth (
	pitch_radius,
	root_radius,
	base_radius,
	outer_radius,
	half_thick_angle,
	involute_facets)
{
	min_radius = max (base_radius,root_radius);

	pitch_point = involute (base_radius, involute_intersect_angle (base_radius, pitch_radius));
	pitch_angle = atan2 (pitch_point[1], pitch_point[0]);
	centre_angle = pitch_angle + half_thick_angle;

	start_angle = involute_intersect_angle (base_radius, min_radius);
	stop_angle = involute_intersect_angle (base_radius, outer_radius);

	res=(involute_facets!=0)?involute_facets:($fn==0)?5:$fn/4;

	union ()
	{
		for (i=[1:res])
		assign (
			point1=involute (base_radius,start_angle+(stop_angle - start_angle)*(i-1)/res),
			point2=involute (base_radius,start_angle+(stop_angle - start_angle)*i/res))
		{
			assign (
				side1_point1=rotate_point (centre_angle, point1),
				side1_point2=rotate_point (centre_angle, point2),
				side2_point1=mirror_point (rotate_point (centre_angle, point1)),
				side2_point2=mirror_point (rotate_point (centre_angle, point2)))
			{
				polygon (
					points=[[0,0],side1_point1,side1_point2,side2_point2,side2_point1],
					paths=[[0,1,2,3,4,0]]);
			}
		}
	}
}

// Mathematical Functions
//===============

// Finds the angle of the involute about the base radius at the given distance (radius) from it's center.
//source: http://www.mathhelpforum.com/math-help/geometry/136011-circle-involute-solving-y-any-given-x.html

function involute_intersect_angle (base_radius, radius) = sqrt (pow (radius/base_radius, 2) - 1) * 180 / pi;

// Calculate the involute position for a given base radius and involute angle.

function rotated_involute (rotate, base_radius, involute_angle) = 
[
	cos (rotate) * involute (base_radius, involute_angle)[0] + sin (rotate) * involute (base_radius, involute_angle)[1],
	cos (rotate) * involute (base_radius, involute_angle)[1] - sin (rotate) * involute (base_radius, involute_angle)[0]
];

function mirror_point (coord) = 
[
	coord[0], 
	-coord[1]
];

function rotate_point (rotate, coord) =
[
	cos (rotate) * coord[0] + sin (rotate) * coord[1],
	cos (rotate) * coord[1] - sin (rotate) * coord[0]
];

function involute (base_radius, involute_angle) = 
[
	base_radius*(cos (involute_angle) + involute_angle*pi/180*sin (involute_angle)),
	base_radius*(sin (involute_angle) - involute_angle*pi/180*cos (involute_angle)),
];


// Test Cases
//===============

module test_gears()
{
	translate([17,-15])
	{
		gear (number_of_teeth=17,
			circular_pitch=500,
			circles=8);
	
		rotate ([0,0,360*4/17])
		translate ([39.088888,0,0])
		{
			gear (number_of_teeth=11,
				circular_pitch=500,
				hub_diameter=0,
				rim_width=65);
			translate ([0,0,8])
			{
				gear (number_of_teeth=6,
					circular_pitch=300,
					hub_diameter=0,
					rim_width=5,
					rim_thickness=6,
					pressure_angle=31);
				rotate ([0,0,360*5/6])
				translate ([22.5,0,1])
				gear (number_of_teeth=21,
					circular_pitch=300,
					bore_diameter=2,
					hub_diameter=4,
					rim_width=1,
					hub_thickness=4,
					rim_thickness=4,
					gear_thickness=3,
					pressure_angle=31);
			}
		}

		translate ([-61.1111111,0,0])
		{
			gear (number_of_teeth=27,
				circular_pitch=500,
				circles=5,
				hub_diameter=2*8.88888889);

			translate ([0,0,10])
			{
				gear (
					number_of_teeth=14,
					circular_pitch=200,
					pressure_angle=5,
					clearance = 0.2,
					gear_thickness = 10,
					rim_thickness = 10,
					rim_width = 15,
					bore_diameter=5,
					circles=0);
				translate ([13.8888888,0,1])
				gear (
					number_of_teeth=11,
					circular_pitch=200,
					pressure_angle=5,
					clearance = 0.2,
					gear_thickness = 10,
					rim_thickness = 10,
					rim_width = 15,
					hub_thickness = 20,
					hub_diameter=2*7.222222,
					bore_diameter=5,
					circles=0);
			}
		}
	
		rotate ([0,0,360*-5/17])
		translate ([44.444444444,0,0])
		gear (number_of_teeth=15,
			circular_pitch=500,
			hub_diameter=10,
			rim_width=5,
			rim_thickness=5,
			gear_thickness=4,
			hub_thickness=6,
			circles=9);
	
		rotate ([0,0,360*-1/17])
		translate ([30.5555555,0,-1])
		gear (number_of_teeth=5,
			circular_pitch=500,
			hub_diameter=0,
			rim_width=5,
			rim_thickness=10);
	}
}

module meshing_double_helix ()
{
	test_double_helix_gear ();
	
	mirror ([0,1,0])
	translate ([58.33333333,0,0])
	test_double_helix_gear (teeth=13,circles=6);
}

module test_double_helix_gear (
	teeth=17,
	circles=8)
{
	//double helical gear
	{
		twist=200;
		height=20;
		pressure_angle=30;

		gear (number_of_teeth=teeth,
			circular_pitch=700,
			pressure_angle=pressure_angle,
			clearance = 0.2,
			gear_thickness = height/2*0.5,
			rim_thickness = height/2,
			rim_width = 5,
			hub_thickness = height/2*1.2,
			hub_diameter=15,
			bore_diameter=5,
			circles=circles,
			twist=twist/teeth);
		mirror([0,0,1])
		gear (number_of_teeth=teeth,
			circular_pitch=700,
			pressure_angle=pressure_angle,
			clearance = 0.2,
			gear_thickness = height/2,
			rim_thickness = height/2,
			rim_width = 5,
			hub_thickness = height/2,
			hub_diameter=15,
			bore_diameter=5,
			circles=circles,
			twist=twist/teeth);
	}
}

module test_backlash ()
{
	backlash = 2;
	teeth = 15;

	translate ([-29.166666,0,0])
	{
		translate ([58.3333333,0,0])
		rotate ([0,0,-360/teeth/4])
		gear (
			number_of_teeth = teeth,
			circular_pitch=700,
			gear_thickness = 12,
			rim_thickness = 15,
			rim_width = 5,
			hub_thickness = 17,
			hub_diameter=15,
			bore_diameter=5,
			backlash = 2,
			circles=8);
		
		rotate ([0,0,360/teeth/4])
		gear (
			number_of_teeth = teeth,
			circular_pitch=700,
			gear_thickness = 12,
			rim_thickness = 15,
			rim_width = 5,
			hub_thickness = 17,
			hub_diameter=15,
			bore_diameter=5,
			backlash = 2,
			circles=8);
	}

	color([0,0,128,0.5])
	translate([0,0,-5])
	cylinder ($fn=20,r=backlash / 4,h=25);
}
